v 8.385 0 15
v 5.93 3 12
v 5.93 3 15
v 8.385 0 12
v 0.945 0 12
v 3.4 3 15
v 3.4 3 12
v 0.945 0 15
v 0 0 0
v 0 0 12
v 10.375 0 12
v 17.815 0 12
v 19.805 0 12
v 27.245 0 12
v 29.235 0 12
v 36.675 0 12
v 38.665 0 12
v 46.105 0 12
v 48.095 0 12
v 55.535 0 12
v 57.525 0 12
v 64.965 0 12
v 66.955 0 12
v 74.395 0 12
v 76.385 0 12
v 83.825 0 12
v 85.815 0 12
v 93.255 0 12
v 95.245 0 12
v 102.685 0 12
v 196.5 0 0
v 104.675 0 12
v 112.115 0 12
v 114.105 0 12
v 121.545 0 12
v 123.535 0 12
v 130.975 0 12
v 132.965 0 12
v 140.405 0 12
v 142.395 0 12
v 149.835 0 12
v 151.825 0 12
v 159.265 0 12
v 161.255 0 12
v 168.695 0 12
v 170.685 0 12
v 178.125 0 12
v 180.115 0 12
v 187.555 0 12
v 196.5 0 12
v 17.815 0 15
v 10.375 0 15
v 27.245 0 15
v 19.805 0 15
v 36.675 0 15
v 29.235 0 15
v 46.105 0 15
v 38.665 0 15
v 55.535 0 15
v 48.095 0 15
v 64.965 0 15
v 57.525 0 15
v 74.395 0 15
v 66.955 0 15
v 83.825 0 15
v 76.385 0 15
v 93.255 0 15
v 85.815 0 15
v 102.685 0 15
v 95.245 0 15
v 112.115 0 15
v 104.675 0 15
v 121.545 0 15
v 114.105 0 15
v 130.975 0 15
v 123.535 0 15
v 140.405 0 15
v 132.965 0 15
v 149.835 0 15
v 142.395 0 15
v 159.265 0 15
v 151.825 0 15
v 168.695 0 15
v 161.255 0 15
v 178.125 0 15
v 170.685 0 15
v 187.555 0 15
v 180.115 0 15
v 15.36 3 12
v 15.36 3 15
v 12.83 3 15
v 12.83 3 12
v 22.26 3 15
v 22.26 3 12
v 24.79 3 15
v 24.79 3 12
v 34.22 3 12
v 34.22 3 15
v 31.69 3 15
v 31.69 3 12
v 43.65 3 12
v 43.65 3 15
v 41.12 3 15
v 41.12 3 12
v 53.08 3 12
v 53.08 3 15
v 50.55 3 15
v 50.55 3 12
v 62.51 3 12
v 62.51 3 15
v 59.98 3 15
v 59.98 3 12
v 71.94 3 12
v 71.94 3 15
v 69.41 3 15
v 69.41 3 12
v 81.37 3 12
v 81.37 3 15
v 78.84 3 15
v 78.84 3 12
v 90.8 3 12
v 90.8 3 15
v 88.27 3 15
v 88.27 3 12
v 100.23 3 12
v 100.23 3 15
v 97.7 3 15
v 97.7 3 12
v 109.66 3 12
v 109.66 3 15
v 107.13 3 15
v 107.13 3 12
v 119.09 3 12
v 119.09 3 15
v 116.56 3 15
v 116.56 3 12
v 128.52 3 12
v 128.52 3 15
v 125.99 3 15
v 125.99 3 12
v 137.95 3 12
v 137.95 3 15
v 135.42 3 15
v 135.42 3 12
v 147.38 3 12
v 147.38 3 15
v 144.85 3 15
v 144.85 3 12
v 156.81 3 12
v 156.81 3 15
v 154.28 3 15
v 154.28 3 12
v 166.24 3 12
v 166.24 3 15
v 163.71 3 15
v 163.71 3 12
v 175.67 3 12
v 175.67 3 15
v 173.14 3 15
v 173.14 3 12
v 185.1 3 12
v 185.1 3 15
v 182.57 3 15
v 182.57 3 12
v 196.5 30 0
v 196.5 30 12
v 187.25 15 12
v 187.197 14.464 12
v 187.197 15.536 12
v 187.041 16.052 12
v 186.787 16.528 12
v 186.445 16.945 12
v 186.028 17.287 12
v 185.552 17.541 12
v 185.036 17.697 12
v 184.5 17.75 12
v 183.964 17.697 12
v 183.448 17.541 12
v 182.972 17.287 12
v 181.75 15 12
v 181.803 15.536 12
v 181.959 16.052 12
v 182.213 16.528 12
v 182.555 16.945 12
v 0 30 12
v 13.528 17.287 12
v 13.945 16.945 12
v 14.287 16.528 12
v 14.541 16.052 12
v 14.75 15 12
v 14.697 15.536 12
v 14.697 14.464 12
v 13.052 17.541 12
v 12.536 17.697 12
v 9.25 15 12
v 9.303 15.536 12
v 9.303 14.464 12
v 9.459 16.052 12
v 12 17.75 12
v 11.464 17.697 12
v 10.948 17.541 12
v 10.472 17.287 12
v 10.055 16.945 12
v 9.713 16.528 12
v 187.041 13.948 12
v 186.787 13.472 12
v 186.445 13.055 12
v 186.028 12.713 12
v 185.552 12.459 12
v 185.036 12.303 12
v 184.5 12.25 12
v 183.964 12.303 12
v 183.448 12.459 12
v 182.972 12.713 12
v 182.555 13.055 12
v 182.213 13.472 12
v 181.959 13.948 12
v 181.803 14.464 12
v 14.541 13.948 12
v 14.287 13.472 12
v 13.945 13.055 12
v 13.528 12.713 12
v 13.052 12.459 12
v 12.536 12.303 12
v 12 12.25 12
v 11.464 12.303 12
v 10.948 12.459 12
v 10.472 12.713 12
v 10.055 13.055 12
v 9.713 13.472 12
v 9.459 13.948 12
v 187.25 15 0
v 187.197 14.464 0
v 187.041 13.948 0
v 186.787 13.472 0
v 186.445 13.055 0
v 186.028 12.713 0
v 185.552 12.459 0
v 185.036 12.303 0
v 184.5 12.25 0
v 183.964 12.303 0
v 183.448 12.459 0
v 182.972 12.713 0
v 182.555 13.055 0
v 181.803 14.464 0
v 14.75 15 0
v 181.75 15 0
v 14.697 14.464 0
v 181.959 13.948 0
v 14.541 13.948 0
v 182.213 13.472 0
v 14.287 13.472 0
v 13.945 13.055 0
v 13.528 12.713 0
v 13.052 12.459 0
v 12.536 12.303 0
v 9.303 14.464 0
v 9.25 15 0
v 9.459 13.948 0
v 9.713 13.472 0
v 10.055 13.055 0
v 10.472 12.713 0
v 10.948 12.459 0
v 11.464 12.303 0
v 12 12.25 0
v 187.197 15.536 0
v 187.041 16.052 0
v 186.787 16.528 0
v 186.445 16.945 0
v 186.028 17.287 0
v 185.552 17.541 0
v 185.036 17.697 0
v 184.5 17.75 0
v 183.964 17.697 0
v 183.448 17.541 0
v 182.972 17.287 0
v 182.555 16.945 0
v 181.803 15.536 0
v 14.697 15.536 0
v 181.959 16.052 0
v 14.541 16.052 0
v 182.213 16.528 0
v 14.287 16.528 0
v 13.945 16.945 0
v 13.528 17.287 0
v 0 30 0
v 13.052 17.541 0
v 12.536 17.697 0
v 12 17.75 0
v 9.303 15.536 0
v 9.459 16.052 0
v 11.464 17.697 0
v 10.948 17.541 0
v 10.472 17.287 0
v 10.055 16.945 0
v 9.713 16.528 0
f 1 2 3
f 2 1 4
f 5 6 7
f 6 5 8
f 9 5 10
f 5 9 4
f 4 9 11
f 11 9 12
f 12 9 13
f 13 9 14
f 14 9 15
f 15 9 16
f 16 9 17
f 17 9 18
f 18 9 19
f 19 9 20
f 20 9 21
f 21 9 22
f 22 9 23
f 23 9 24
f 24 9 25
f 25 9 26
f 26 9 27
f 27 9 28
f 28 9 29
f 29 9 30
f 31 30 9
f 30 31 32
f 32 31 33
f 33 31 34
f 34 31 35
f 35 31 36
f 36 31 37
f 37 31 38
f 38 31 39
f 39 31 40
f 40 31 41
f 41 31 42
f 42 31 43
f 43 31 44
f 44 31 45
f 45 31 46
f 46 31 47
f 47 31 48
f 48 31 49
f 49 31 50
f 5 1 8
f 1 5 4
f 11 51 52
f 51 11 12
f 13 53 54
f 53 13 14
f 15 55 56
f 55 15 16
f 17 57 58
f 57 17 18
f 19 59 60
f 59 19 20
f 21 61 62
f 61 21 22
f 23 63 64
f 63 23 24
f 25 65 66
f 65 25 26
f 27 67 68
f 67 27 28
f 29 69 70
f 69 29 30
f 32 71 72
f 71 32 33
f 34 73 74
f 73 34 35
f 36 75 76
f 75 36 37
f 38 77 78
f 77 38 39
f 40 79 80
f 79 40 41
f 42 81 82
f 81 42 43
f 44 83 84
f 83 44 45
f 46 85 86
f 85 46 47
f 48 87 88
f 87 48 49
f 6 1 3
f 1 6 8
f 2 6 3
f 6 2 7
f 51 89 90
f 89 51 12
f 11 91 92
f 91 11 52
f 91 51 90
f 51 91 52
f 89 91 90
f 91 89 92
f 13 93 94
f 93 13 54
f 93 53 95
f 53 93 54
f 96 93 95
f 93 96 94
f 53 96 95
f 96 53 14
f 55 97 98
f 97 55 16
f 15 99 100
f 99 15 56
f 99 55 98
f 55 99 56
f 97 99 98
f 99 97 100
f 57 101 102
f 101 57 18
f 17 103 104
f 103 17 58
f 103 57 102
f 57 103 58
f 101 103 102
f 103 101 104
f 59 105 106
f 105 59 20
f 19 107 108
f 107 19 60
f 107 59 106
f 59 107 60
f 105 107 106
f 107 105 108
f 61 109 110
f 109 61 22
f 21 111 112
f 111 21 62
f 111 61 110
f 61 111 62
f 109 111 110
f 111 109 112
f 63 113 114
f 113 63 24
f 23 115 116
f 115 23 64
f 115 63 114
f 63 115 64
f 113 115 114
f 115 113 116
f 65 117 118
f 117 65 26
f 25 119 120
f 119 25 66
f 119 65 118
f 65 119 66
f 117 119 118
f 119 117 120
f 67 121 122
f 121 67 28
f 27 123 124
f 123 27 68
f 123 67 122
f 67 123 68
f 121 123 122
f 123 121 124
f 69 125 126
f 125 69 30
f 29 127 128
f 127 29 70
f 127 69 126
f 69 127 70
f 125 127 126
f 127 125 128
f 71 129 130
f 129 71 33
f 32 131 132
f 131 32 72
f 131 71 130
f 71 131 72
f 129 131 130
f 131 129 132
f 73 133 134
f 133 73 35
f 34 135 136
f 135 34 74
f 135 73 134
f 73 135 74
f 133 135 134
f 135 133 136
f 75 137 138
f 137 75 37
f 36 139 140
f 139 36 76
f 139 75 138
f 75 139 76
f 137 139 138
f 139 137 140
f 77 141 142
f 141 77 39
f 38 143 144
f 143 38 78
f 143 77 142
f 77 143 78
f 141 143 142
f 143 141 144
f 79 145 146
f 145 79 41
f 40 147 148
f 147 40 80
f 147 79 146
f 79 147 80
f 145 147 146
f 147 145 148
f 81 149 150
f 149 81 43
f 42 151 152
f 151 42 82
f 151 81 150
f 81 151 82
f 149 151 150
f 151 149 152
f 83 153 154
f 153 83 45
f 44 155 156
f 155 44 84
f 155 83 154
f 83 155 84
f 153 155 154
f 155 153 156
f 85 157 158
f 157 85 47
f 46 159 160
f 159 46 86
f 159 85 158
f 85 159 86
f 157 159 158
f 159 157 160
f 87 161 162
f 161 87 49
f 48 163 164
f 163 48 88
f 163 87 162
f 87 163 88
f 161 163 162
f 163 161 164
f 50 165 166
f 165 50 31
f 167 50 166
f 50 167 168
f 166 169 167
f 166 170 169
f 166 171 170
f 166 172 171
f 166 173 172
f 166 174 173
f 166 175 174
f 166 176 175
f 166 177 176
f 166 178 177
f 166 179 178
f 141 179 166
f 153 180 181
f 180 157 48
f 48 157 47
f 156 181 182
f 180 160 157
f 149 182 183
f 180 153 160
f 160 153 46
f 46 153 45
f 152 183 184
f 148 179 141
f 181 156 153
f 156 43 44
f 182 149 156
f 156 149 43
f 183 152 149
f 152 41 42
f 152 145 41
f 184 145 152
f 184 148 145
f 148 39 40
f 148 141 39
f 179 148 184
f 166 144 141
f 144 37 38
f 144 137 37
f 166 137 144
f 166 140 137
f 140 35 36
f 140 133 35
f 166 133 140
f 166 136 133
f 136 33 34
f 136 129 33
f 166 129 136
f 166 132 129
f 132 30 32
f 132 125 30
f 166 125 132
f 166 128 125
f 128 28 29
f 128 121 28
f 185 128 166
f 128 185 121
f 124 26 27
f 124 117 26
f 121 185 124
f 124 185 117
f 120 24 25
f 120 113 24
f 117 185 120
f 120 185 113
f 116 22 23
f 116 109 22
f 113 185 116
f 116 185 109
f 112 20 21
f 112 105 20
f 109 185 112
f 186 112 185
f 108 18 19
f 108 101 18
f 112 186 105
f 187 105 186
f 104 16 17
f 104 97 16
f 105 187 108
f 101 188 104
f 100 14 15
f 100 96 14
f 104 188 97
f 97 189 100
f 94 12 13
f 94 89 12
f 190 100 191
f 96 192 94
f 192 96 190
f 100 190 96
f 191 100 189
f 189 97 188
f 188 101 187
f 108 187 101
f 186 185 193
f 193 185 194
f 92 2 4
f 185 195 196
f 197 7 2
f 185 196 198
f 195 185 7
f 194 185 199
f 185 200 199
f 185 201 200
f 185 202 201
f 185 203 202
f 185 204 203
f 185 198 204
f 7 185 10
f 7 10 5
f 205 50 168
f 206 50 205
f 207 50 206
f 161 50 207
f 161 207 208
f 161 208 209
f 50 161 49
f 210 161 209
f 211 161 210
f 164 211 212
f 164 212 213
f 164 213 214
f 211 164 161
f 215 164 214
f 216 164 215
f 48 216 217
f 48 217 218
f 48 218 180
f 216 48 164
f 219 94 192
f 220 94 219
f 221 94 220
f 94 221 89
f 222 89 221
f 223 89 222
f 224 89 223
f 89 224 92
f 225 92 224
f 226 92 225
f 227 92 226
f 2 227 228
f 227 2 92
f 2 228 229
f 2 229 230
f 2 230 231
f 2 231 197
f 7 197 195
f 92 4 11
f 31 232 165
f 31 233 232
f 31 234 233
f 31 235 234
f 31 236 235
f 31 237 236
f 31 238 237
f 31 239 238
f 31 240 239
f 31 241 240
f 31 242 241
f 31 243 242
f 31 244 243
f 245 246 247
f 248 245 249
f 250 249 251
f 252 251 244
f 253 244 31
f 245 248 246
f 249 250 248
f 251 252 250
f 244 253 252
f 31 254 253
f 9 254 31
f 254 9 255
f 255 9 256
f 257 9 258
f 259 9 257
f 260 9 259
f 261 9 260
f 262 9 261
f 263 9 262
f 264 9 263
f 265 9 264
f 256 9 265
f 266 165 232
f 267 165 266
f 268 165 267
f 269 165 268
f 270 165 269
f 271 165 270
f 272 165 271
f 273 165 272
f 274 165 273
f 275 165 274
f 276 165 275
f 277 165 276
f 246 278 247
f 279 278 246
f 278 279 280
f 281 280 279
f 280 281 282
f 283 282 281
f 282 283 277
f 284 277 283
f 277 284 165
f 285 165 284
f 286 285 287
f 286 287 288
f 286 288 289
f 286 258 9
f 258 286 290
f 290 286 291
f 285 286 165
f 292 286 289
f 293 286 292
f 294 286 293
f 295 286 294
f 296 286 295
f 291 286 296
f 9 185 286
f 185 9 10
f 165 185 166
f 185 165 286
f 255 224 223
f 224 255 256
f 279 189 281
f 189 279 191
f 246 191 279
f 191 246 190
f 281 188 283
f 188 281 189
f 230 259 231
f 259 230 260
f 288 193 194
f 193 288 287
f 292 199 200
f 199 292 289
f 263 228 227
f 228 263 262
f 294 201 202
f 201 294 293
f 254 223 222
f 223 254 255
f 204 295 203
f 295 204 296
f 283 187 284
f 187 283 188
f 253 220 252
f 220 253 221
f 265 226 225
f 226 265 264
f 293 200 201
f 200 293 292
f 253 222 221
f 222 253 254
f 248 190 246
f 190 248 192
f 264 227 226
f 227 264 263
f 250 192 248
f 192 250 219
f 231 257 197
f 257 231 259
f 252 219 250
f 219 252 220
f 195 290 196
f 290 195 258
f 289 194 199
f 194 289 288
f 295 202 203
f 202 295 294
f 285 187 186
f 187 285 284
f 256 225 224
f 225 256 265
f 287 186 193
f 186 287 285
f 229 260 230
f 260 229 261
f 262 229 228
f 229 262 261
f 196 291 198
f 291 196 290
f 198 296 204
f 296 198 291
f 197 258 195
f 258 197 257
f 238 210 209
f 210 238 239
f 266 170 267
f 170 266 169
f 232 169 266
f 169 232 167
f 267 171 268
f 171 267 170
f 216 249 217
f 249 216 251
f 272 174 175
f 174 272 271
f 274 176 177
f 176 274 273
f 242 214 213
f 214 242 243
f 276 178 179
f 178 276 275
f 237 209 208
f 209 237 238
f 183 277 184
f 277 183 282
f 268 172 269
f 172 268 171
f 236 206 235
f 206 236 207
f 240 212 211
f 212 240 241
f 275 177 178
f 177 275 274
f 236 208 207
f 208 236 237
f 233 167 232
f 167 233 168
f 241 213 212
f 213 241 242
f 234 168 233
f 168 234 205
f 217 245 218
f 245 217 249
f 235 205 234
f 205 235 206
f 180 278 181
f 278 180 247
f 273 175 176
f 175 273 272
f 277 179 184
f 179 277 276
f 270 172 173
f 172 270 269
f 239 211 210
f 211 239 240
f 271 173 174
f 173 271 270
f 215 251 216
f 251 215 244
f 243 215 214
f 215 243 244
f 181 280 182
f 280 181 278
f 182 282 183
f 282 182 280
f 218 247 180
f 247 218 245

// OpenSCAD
$fn = 32;

// ----------------------------------------------------------------------
// Gear rack: m=3 z=20, 196.5 x 30 x 15 mm
// ----------------------------------------------------------------------

// --- parameters (mm) ---
length = 196.5;           // rack length, X
width = 30;               // rack width, Y
height = 15;              // overall height, Z
module_m = 3;             // module
back_t = 12;              // tooth root line height
pitch = 9.43;             // circular pitch
tip_w = 2.53;             // tooth thickness at the tip
root_w = 7.44;            // tooth thickness at the root line
hole_d = 5.5;             // mounting hole
sink = 0.6;               // tooth root overlap into the body

tooth_span = 188.5;

module tooth(x0) {
  /* 20 deg flank profile, sunk into the body for a positive overlap */
  translate([x0, 0, back_t - sink])
    linear_extrude(height = height - back_t + sink)
      polygon(points = [[-root_w / 2, 0], [root_w / 2, 0],
                        [tip_w / 2, height - back_t],
                        [-tip_w / 2, height - back_t]]);
}

difference() {
  union() {
    cube([length, width, back_t]);
    for (i = [0 : 20 - 1])
      tooth((i + 0.5) * pitch + (tooth_span - 20 * pitch) / 2);
  }
  translate([12, 15, -1]) cylinder(h = back_t + 2, d = hole_d);
  translate([184.5, 15, -1]) cylinder(h = back_t + 2, d = hole_d);
}
